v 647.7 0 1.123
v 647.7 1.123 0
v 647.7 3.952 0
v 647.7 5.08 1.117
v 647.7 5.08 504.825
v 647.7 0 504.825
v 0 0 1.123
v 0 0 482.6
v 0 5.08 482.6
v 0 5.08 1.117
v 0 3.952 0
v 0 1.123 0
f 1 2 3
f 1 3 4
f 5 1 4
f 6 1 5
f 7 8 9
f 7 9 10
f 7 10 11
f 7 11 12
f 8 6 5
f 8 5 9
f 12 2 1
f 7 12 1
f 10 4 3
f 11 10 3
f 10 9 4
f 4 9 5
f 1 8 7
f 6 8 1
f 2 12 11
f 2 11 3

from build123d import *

# Parameters (mm, degrees)
F1_DEPTH = 5.08
F3_DEPTH = 751.84


with BuildPart() as f1:
    # F0 (on Front) → F1 (new body)
    with BuildSketch(Plane.XZ):
        Polygon((0, 482.6), (0, 0), (647.7, 0), (647.7, 504.825), align=None)
    extrude(amount=-F1_DEPTH)

    # F2 (on face) → F3 (cut)
    with BuildSketch(Plane.YZ.offset(647.7)):
        Polygon((5.08, 1.116884), (3.951849, 0), (5.08, 0), align=None)
        Polygon((0, 1.122531), (0, 0), (1.122533, 0), align=None)
    extrude(amount=-F3_DEPTH, mode=Mode.SUBTRACT)


solid = f1.part
